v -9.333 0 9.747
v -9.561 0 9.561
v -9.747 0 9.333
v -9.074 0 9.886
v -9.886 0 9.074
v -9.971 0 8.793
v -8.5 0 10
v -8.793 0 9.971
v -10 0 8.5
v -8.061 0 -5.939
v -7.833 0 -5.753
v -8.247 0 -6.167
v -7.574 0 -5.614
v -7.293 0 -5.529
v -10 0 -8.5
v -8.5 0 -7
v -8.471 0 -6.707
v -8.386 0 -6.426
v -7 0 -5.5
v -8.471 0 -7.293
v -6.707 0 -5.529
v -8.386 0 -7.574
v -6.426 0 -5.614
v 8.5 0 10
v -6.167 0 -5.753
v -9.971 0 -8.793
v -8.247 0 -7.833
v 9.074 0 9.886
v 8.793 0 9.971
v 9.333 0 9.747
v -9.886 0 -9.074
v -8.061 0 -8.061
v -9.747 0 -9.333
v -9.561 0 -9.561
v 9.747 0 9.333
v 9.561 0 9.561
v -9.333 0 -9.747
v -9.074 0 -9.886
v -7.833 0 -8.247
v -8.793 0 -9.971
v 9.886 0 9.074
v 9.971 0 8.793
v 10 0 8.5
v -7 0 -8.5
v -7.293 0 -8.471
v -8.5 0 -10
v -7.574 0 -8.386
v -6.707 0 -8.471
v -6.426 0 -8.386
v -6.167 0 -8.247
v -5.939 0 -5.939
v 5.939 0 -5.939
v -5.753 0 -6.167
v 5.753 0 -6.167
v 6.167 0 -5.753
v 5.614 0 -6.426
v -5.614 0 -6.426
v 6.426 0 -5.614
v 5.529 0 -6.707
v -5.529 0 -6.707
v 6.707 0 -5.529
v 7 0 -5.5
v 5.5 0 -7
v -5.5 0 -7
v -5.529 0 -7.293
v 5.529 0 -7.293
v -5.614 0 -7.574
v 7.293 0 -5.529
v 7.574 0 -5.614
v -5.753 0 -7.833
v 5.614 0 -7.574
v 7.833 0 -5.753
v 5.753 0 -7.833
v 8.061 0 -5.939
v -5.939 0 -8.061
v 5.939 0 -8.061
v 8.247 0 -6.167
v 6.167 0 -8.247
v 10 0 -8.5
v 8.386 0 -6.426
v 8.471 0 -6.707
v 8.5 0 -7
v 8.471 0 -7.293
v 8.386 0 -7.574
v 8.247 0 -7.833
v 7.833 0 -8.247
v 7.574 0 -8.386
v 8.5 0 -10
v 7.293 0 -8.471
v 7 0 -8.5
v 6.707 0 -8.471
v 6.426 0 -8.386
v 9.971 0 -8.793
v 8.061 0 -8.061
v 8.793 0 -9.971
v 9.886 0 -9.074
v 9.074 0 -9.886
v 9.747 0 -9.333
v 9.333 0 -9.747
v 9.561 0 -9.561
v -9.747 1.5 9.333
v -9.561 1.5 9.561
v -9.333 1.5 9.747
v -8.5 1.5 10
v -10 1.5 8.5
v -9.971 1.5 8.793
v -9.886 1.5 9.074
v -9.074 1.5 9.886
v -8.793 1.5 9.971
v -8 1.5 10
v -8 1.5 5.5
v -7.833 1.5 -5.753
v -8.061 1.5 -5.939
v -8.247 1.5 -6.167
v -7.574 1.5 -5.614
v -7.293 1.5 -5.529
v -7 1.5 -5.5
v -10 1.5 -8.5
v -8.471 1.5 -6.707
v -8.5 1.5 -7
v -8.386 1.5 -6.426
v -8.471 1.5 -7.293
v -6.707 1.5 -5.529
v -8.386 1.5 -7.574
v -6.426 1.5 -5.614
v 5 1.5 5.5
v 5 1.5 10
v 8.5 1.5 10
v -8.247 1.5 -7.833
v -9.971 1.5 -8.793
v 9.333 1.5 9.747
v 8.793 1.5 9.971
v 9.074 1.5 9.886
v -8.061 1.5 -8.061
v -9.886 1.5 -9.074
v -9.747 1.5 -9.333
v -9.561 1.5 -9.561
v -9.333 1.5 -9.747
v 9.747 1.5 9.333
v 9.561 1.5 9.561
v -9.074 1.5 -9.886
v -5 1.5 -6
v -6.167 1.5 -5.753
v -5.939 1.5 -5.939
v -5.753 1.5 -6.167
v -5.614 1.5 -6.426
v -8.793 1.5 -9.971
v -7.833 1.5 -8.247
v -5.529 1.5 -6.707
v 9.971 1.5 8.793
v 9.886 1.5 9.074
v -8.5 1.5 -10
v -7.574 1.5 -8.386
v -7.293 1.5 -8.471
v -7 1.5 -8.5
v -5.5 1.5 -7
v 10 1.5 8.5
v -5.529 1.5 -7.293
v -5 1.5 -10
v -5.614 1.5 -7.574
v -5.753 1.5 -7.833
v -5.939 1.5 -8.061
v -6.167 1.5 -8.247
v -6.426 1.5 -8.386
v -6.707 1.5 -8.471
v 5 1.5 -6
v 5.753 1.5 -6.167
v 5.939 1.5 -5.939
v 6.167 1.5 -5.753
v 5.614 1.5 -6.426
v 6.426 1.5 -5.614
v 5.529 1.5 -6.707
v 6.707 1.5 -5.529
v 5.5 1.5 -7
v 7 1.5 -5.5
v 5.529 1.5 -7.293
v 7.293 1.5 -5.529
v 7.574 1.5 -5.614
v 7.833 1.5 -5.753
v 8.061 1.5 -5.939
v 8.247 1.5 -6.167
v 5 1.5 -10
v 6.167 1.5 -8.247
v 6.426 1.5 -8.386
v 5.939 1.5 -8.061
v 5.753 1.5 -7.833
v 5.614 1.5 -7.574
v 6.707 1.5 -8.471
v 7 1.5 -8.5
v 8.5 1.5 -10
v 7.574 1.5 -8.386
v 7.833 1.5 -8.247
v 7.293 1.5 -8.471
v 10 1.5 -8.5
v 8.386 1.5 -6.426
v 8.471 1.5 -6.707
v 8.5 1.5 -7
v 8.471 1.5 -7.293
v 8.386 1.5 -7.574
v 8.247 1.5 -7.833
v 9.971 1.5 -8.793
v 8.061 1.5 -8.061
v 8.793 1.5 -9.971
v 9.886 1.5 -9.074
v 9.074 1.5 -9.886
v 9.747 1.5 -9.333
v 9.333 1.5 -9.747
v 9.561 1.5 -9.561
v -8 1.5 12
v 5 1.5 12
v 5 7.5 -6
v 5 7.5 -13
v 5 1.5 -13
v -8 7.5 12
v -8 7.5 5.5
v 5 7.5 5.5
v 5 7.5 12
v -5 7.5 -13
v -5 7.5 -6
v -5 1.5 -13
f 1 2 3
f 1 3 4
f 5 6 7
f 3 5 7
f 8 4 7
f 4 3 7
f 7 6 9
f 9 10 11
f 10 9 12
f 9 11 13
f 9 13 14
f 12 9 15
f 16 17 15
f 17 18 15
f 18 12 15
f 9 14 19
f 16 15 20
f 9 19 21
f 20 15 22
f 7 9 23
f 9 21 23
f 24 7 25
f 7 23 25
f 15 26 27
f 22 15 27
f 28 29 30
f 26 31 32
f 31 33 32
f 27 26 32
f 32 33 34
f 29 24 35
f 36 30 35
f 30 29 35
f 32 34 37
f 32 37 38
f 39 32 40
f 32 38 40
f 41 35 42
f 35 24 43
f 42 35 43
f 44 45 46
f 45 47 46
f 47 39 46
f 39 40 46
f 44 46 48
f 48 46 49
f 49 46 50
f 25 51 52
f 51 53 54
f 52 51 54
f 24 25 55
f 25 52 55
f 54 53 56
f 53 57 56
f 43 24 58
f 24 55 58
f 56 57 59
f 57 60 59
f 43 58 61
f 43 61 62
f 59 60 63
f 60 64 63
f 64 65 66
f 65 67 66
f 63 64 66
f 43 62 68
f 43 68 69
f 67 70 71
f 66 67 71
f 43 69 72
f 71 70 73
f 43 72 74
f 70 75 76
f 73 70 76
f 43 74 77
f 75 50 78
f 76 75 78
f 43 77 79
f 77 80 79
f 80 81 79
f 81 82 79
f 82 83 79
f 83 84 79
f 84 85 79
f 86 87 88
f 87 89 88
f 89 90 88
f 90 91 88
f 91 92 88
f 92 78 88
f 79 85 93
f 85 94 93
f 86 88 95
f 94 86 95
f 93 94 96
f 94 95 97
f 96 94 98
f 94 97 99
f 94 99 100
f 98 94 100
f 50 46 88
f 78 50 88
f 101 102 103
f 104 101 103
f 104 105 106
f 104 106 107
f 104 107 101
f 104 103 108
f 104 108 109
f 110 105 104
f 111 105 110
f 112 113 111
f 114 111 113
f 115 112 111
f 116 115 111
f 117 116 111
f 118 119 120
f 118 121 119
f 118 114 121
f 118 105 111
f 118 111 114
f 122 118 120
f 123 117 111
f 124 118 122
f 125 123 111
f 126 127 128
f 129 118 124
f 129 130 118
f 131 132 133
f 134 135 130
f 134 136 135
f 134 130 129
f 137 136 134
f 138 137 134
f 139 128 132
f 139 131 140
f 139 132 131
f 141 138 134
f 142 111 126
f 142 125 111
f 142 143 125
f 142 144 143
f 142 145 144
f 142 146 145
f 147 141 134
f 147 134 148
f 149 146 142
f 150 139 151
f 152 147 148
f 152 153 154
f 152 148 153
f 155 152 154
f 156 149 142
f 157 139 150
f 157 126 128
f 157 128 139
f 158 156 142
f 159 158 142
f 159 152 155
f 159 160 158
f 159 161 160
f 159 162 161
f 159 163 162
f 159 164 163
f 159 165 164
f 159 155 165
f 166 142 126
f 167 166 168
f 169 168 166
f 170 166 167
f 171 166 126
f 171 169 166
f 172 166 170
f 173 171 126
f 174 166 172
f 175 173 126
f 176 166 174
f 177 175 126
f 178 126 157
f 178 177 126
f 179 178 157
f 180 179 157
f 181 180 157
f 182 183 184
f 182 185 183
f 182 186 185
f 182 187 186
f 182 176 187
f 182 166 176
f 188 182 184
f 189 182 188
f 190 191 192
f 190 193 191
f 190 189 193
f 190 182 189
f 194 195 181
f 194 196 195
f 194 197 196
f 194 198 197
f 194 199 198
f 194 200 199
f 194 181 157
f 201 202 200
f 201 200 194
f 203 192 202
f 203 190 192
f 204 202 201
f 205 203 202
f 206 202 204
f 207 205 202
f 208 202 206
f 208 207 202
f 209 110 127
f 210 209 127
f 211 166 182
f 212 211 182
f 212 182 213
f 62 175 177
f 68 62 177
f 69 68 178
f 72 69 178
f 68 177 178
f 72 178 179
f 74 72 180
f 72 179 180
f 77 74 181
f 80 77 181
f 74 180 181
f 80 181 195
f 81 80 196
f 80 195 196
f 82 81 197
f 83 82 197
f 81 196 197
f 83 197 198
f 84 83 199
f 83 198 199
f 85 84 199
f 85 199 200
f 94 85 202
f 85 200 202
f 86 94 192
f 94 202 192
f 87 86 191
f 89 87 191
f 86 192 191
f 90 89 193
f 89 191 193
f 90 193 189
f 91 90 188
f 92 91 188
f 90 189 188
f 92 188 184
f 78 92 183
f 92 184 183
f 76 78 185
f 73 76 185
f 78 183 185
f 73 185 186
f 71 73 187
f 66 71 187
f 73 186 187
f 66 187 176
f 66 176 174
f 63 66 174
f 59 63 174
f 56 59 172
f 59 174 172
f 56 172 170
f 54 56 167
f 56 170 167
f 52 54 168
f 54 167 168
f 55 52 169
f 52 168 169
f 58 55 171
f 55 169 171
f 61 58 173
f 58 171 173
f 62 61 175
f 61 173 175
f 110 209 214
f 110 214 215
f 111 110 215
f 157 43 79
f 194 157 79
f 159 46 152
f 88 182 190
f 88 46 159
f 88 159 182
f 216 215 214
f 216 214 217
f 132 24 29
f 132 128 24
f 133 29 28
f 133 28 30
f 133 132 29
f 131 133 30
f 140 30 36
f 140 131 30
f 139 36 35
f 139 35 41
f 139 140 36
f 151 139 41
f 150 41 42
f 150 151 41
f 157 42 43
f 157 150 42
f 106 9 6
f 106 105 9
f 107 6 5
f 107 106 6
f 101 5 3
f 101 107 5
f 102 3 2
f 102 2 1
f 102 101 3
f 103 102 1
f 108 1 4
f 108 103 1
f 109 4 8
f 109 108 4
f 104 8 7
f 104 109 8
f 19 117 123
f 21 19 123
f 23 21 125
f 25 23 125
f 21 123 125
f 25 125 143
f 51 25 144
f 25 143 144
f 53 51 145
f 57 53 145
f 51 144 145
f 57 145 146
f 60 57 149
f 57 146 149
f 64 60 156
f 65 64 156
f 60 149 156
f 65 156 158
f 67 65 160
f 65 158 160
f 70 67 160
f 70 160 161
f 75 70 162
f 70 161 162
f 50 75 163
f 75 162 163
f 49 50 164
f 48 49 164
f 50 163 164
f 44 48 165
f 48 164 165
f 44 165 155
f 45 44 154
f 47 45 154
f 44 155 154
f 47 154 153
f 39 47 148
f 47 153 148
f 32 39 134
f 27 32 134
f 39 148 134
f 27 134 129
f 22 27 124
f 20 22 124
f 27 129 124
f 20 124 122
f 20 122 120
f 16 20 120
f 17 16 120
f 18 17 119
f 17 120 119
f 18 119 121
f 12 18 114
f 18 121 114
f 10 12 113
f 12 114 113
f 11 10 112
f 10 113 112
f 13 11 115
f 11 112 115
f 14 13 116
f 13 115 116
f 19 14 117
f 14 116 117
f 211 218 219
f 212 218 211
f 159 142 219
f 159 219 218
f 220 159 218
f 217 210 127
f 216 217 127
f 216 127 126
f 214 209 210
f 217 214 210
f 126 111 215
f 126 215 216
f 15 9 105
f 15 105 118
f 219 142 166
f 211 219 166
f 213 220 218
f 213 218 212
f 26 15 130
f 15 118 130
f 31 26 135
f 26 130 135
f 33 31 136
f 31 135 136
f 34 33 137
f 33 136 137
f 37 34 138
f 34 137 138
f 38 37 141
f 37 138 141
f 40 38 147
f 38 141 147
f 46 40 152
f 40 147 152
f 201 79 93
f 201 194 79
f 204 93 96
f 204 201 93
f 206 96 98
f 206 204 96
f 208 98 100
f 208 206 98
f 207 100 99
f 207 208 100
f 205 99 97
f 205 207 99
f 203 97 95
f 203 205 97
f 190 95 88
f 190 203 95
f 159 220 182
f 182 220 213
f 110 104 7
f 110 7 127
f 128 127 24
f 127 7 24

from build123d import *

# Parameters (mm, degrees)
SKETCH1_W           = 20
SKETCH1_H           = 20
BOSS_EXTRUDE1_DEPTH = 1.5
FILLET1_R           = 1.5
SKETCH2_R           = 1.5
CUT_EXTRUDE1_DEPTH  = 1.5
SKETCH3_W           = 10
SKETCH3_H           = 7
BOSS_EXTRUDE2_DEPTH = 6
SKETCH4_W           = 13
SKETCH4_H           = 6.5
BOSS_EXTRUDE3_DEPTH = 6


with BuildPart() as part:
    # Sketch1 → Boss-Extrude1 (new body)
    with BuildSketch(Plane(origin=(0, 0, 0), x_dir=(1, 0, 0), z_dir=(0, 1, 0))):
        Rectangle(SKETCH1_W, SKETCH1_H)
    extrude(amount=BOSS_EXTRUDE1_DEPTH)

    # Fillet1
    fillet1_edges = [part.edges().sort_by_distance(p)[0] for p in [
        (-10, 0.75, -10),
        (10, 0.75, -10),
        (10, 0.75, 10),
        (-10, 0.75, 10),
    ]]
    fillet(fillet1_edges, radius=FILLET1_R)

    # Sketch2 → Cut-Extrude1 (cut)
    with BuildSketch(Plane(origin=(0, 1.5, 0), x_dir=(1, 0, 0), z_dir=(0, 1, 0))):
        with Locations(Location((7, 7, 0), (0, 0, 270))):
            Circle(SKETCH2_R)
        with Locations(Location((-7, 7, 0), (0, 0, 270))):
            Circle(SKETCH2_R)
    extrude(amount=-CUT_EXTRUDE1_DEPTH, mode=Mode.SUBTRACT)

    # Sketch3 → Boss-Extrude2 (add)
    with BuildSketch(Plane(origin=(0, 1.5, 0), x_dir=(1, 0, 0), z_dir=(0, 1, 0))):
        with Locations((0, 9.5)):
            Rectangle(SKETCH3_W, SKETCH3_H)
    extrude(amount=BOSS_EXTRUDE2_DEPTH)

    # Sketch4 → Boss-Extrude3 (add)
    with BuildSketch(Plane(origin=(0, 1.5, 0), x_dir=(1, 0, 0), z_dir=(0, 1, 0))):
        with Locations((-1.5, -8.75)):
            Rectangle(SKETCH4_W, SKETCH4_H)
    extrude(amount=BOSS_EXTRUDE3_DEPTH)


solid = part.part
